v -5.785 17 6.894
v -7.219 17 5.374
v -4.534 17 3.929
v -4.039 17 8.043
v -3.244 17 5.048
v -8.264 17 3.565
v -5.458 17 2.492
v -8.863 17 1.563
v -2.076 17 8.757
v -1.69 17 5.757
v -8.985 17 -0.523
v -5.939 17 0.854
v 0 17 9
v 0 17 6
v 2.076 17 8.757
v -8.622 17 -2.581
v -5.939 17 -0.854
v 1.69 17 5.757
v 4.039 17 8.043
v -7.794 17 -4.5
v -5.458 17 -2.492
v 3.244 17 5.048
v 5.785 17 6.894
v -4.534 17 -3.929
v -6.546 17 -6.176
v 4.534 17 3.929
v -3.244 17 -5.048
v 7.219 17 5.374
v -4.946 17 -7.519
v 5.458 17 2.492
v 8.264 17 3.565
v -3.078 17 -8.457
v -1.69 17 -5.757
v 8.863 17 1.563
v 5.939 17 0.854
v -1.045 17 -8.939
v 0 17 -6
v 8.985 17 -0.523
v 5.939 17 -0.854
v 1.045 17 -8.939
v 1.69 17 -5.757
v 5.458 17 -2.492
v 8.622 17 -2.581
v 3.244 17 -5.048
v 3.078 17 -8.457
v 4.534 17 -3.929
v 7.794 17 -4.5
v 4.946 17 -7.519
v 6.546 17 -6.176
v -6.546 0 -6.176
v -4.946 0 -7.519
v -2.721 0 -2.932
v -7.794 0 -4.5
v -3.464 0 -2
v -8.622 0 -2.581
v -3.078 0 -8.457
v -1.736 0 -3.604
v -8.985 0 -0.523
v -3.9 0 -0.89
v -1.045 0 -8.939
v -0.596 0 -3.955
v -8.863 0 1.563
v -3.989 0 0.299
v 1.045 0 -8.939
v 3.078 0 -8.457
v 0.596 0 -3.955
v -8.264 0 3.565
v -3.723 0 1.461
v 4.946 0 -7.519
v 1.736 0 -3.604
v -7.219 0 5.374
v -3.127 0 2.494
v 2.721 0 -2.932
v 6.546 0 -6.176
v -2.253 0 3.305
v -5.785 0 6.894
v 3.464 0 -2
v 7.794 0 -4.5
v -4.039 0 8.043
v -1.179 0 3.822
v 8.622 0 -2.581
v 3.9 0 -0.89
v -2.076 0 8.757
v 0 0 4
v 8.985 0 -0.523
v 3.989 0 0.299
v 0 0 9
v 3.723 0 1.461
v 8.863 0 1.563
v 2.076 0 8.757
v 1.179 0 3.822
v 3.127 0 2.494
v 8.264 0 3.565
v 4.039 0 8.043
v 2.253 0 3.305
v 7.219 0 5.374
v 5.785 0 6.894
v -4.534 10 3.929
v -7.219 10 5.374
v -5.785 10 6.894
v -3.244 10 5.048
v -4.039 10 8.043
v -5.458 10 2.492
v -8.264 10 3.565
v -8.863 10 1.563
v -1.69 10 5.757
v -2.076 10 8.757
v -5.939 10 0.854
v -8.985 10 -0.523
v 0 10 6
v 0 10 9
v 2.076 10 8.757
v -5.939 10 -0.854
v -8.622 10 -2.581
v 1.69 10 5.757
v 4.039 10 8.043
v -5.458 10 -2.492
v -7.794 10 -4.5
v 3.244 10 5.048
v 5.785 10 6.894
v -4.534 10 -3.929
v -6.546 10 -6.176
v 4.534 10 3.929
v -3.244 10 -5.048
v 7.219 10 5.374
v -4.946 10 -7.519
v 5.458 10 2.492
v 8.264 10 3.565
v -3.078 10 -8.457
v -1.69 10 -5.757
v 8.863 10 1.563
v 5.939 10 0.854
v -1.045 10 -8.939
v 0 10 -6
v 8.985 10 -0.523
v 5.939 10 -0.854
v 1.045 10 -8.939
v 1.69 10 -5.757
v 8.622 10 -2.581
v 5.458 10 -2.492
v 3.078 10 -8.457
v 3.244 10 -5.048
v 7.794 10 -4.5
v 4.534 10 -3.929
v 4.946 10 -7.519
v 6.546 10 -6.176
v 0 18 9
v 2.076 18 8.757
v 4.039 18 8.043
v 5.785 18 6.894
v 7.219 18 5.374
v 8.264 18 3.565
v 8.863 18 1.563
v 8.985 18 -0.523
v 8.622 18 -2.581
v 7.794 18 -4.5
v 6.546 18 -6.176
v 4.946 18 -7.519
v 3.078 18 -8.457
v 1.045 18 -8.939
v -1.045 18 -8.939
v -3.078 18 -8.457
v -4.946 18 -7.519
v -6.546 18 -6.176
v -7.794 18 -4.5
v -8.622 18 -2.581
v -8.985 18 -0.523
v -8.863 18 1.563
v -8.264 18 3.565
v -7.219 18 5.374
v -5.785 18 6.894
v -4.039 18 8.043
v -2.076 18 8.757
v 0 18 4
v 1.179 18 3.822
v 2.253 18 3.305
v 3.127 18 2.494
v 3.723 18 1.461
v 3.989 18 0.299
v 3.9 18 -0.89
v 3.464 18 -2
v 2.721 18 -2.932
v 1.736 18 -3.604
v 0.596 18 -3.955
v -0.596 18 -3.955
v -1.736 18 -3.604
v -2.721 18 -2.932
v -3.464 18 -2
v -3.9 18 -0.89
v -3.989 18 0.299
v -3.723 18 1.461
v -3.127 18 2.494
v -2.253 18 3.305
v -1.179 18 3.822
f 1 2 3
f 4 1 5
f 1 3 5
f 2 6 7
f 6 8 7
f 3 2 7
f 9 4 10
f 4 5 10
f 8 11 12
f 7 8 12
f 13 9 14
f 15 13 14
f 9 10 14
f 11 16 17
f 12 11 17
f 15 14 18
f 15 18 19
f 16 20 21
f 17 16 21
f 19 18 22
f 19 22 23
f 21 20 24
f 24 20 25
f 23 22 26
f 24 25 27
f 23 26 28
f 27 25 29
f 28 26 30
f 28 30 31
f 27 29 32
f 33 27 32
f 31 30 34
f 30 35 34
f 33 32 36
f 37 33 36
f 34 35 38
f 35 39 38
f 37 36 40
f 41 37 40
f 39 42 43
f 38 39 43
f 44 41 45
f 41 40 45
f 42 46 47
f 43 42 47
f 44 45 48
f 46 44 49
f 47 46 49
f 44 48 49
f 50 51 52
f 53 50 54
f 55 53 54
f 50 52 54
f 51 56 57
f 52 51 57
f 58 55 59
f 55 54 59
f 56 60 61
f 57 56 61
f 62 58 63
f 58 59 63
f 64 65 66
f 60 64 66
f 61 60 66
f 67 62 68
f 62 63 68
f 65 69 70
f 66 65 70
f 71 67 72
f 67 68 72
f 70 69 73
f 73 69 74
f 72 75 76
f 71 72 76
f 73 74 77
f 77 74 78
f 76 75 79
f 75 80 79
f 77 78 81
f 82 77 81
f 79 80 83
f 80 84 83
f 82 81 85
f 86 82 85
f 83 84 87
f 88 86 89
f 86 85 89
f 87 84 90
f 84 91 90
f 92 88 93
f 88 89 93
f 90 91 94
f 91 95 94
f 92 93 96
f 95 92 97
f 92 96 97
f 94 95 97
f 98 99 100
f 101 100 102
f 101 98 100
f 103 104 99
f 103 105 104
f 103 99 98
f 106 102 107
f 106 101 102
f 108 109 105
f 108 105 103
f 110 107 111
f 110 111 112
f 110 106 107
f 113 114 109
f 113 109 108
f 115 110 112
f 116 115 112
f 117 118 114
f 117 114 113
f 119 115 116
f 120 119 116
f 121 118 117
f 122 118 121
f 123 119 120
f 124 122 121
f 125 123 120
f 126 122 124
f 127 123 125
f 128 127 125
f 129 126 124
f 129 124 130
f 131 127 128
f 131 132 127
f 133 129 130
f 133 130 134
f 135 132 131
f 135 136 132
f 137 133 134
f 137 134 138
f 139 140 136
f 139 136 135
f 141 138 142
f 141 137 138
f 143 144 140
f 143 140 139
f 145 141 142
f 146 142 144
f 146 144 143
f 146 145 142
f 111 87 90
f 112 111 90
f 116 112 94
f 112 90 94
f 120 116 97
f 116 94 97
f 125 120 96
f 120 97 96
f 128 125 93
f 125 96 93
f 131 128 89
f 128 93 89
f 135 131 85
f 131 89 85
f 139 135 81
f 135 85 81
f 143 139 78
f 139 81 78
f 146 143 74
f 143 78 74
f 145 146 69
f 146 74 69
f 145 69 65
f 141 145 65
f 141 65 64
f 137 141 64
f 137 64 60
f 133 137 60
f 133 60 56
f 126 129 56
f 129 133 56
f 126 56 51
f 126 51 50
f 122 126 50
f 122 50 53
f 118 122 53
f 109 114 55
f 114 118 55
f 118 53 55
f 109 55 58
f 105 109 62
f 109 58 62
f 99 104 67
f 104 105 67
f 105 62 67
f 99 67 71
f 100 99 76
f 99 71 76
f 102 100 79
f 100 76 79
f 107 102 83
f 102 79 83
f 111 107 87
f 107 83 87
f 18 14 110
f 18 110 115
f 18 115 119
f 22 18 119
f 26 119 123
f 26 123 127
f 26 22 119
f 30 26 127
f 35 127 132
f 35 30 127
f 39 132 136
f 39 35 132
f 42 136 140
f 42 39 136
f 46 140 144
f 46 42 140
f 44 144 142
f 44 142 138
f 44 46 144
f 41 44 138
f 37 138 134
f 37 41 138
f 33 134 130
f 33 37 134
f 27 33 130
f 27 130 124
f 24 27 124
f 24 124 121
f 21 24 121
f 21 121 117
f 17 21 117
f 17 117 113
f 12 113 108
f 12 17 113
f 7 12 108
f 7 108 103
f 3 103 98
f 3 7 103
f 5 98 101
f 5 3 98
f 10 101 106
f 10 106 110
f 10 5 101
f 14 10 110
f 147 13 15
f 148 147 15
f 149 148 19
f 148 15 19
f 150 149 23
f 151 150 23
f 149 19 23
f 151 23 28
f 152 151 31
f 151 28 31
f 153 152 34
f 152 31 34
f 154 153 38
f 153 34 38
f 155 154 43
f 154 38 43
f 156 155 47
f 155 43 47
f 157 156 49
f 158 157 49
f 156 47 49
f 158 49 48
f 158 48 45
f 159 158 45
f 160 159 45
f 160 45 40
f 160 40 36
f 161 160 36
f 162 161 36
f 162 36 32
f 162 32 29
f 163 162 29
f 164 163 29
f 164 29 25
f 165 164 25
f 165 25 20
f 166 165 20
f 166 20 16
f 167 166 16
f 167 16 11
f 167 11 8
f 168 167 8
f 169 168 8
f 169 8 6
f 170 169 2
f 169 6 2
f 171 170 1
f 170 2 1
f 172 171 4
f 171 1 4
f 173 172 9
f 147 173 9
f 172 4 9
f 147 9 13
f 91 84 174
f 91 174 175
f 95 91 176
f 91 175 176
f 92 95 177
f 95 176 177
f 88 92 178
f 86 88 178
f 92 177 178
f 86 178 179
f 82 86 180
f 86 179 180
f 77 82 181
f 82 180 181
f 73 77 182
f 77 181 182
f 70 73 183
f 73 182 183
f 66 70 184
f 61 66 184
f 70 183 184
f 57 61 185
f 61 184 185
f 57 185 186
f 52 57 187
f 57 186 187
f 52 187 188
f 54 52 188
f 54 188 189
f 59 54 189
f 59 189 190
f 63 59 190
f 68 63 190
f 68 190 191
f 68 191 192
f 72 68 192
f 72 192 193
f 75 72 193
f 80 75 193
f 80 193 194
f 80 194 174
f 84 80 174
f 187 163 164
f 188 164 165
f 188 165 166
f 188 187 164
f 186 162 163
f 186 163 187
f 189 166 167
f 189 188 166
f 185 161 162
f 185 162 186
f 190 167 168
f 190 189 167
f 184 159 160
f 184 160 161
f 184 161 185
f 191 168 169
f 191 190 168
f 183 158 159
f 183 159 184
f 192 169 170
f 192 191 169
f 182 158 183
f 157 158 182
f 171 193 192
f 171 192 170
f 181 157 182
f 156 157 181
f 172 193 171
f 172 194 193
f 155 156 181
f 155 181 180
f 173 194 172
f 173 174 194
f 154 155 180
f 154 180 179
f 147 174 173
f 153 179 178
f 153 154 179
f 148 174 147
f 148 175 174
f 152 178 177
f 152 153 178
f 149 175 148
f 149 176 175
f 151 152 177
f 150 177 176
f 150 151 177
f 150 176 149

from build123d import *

# Parameters (mm, degrees)
SKETCH1_R           = 9
BOSS_EXTRUDE1_DEPTH = 18
SKETCH2_R           = 4
CUT_EXTRUDE1_DEPTH  = 23.045407685
CUT_EXTRUDE2_START  = -1
SKETCH3_R           = 10
SKETCH3_R_2         = 6
CUT_EXTRUDE2_DEPTH  = 7


with BuildPart() as part:
    # Sketch1 → Boss-Extrude1 (new body)
    with BuildSketch(Plane(origin=(0, 0, 0), x_dir=(1, 0, 0), z_dir=(0, 1, 0))):
        with Locations(Location((0, 0, 0), (0, 0, 270))):
            Circle(SKETCH1_R)
    extrude(amount=BOSS_EXTRUDE1_DEPTH)

    # Sketch2 → Cut-Extrude1 (cut, through all)
    with BuildSketch(Plane(origin=(0, 18, 0), x_dir=(1, 0, 0), z_dir=(0, 1, 0))):
        with Locations(Location((0, 0, 0), (0, 0, 270))):
            Circle(SKETCH2_R)
    extrude(amount=-CUT_EXTRUDE1_DEPTH, mode=Mode.SUBTRACT)

    # Sketch3 → Cut-Extrude2 (cut)
    with BuildSketch(Plane(origin=(0, 18, 0), x_dir=(1, 0, 0), z_dir=(0, 1, 0)).offset(CUT_EXTRUDE2_START)):
        Circle(SKETCH3_R)
        with Locations(Location((0, 0, 0), (0, 0, 270))):
            Circle(SKETCH3_R_2, mode=Mode.SUBTRACT)
    extrude(amount=-CUT_EXTRUDE2_DEPTH, mode=Mode.SUBTRACT)


solid = part.part
